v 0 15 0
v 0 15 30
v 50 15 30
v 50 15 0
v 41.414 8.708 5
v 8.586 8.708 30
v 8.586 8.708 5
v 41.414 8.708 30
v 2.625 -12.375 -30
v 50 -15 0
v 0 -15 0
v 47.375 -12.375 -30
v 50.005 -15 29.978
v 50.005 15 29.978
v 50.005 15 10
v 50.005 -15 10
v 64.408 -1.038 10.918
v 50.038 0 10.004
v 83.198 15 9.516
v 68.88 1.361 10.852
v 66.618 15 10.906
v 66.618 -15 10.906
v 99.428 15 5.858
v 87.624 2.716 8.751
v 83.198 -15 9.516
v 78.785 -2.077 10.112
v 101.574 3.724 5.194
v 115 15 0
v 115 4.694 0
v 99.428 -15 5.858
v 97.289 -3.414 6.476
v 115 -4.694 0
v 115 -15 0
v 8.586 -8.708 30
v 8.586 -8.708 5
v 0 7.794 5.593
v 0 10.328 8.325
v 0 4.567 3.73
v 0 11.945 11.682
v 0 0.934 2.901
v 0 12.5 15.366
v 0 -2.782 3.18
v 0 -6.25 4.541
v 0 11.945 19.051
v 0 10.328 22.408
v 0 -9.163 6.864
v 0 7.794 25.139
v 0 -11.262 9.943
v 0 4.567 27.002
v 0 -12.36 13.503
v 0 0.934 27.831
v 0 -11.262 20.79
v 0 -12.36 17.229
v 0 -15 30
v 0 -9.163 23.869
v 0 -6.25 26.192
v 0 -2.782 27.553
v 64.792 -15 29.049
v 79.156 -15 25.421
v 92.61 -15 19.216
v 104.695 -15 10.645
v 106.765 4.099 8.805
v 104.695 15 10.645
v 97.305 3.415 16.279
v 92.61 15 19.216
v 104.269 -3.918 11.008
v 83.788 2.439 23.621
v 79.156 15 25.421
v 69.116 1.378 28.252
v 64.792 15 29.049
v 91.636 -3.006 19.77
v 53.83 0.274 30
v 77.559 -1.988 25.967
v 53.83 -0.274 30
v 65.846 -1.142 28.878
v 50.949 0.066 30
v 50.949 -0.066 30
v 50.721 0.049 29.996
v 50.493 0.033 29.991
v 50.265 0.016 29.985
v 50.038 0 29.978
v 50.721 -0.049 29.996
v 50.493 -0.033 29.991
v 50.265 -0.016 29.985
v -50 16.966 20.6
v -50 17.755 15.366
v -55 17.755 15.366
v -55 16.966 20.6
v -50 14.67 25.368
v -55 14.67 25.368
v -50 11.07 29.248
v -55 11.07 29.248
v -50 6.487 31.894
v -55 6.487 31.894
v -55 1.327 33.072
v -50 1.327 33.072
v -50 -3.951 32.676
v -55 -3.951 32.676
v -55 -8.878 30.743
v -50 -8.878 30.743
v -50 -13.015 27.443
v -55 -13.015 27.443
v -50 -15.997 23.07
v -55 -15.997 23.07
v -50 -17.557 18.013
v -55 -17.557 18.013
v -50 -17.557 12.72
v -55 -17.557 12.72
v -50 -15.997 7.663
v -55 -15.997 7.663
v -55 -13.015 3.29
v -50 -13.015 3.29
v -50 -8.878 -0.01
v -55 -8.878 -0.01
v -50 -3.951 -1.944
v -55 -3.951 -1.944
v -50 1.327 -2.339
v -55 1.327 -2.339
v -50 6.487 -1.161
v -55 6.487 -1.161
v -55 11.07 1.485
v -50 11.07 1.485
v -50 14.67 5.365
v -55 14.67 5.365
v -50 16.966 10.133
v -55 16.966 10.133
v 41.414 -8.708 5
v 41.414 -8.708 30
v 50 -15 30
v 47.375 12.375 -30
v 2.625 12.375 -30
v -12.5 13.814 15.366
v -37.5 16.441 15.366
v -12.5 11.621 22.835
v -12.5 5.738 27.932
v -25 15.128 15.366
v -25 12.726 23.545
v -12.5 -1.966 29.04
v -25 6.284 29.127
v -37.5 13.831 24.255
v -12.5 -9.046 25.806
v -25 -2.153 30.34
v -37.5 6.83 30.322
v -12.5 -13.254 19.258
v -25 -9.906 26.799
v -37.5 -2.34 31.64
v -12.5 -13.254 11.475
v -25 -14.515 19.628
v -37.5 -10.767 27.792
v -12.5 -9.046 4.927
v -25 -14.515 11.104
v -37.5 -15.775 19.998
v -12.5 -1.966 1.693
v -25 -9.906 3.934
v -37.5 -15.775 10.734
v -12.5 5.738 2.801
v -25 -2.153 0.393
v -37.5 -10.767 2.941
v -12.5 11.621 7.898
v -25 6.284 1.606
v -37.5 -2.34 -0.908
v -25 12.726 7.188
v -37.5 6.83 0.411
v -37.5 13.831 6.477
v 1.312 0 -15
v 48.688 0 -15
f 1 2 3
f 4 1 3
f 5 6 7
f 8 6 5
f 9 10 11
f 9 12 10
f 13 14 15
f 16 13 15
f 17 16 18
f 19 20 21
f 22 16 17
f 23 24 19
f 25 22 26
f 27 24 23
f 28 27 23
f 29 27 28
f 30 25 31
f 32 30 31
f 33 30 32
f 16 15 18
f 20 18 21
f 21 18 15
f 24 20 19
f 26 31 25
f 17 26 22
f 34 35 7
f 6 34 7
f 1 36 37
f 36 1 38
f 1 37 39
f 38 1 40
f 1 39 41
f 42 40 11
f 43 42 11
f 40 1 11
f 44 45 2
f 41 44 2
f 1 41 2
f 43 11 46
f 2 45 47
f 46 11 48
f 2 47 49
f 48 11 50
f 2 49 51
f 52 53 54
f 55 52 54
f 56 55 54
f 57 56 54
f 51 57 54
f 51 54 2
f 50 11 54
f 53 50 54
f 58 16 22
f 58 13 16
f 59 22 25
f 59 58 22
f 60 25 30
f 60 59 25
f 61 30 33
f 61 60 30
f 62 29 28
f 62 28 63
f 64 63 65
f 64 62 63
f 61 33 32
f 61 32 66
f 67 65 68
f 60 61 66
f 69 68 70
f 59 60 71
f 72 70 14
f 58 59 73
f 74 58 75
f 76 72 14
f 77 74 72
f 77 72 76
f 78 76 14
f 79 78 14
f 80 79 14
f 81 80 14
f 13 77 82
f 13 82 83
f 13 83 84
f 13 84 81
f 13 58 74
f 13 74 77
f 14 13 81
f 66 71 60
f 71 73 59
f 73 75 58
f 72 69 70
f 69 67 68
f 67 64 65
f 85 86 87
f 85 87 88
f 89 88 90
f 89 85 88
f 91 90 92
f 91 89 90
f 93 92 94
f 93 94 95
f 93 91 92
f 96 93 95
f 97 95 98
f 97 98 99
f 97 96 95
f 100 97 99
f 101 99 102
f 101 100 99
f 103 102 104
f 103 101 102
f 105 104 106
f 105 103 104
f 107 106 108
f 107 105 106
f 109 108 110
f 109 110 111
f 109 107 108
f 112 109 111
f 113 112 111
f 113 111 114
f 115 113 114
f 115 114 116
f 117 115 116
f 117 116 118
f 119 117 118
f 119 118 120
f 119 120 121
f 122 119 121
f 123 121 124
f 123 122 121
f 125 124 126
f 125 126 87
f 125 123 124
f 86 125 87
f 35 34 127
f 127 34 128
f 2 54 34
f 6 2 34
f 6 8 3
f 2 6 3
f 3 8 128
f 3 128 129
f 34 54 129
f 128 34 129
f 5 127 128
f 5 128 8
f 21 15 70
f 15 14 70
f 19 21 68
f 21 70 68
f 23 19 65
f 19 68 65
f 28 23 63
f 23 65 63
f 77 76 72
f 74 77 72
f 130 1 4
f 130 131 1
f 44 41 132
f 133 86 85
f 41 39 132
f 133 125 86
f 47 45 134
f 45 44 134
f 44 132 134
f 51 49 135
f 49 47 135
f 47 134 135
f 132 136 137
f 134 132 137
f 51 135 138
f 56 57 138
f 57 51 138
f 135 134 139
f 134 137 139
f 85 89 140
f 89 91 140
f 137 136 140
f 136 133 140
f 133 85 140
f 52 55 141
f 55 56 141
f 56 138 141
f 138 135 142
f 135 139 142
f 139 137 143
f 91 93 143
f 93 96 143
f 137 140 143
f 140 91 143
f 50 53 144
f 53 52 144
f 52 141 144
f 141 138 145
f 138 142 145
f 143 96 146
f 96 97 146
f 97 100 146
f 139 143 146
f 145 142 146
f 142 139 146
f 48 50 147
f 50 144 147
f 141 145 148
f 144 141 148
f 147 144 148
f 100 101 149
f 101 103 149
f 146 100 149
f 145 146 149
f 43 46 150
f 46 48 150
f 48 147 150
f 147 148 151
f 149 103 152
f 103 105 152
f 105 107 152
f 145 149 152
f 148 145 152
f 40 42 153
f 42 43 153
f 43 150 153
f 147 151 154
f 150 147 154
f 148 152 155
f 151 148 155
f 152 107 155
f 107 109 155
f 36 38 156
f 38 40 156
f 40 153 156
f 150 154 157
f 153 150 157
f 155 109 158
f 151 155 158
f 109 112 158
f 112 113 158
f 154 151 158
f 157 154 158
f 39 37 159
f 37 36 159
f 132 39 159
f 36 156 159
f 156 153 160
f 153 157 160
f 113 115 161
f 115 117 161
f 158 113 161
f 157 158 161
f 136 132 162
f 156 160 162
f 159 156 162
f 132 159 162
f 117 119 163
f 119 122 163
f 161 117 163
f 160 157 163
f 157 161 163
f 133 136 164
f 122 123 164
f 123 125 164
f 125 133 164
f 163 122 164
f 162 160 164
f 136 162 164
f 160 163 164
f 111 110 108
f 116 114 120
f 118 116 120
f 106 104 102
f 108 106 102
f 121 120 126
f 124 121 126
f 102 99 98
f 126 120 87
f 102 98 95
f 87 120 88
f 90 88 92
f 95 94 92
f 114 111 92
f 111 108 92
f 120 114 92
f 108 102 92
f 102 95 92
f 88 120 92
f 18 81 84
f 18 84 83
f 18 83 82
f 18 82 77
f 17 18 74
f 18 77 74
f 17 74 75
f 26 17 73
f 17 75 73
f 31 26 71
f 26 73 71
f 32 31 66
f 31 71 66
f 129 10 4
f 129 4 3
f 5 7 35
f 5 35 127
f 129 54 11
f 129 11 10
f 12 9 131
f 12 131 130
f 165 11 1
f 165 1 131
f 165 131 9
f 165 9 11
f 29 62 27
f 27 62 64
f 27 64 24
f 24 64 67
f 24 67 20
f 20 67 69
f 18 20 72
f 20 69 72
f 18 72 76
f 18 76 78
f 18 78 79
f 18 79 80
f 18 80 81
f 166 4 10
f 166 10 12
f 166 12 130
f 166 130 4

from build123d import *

# Parameters (mm, degrees)
F0_W      = 50
F0_H      = 30
F1_DEPTH  = 15
F1_FACE_W = 50
F1_FACE_H = 30
F2_DEPTH  = 30
F2_TAPER  = 5
F3_R      = 12.5
F4_DEPTH  = 50
F4_TAPER  = -6
F6_DEPTH  = 15
F7_DEPTH  = 5
F9_DEPTH  = 30
F10_W     = 32.8289911151
F10_H     = 17.4164976925
F11_DEPTH = 25


with BuildPart() as f1:
    # F0 (on Front) → F1 (new body, symmetric)
    with BuildSketch(Plane.XZ):
        with Locations((25, 15)):
            Rectangle(F0_W, F0_H)
    extrude(amount=F1_DEPTH, both=True)

    # F1_face (on face) → F2 (join)
    with BuildSketch(Plane(origin=(25, 0, 0), x_dir=(1, 0, 0), z_dir=(0, 0, -1))):
        Rectangle(F1_FACE_W, F1_FACE_H)
    extrude(amount=F2_DEPTH, taper=F2_TAPER)

    # F3 (on Right) → F4 (join)
    with BuildSketch(Plane.YZ):
        with Locations((0, 15.3663739569)):
            Circle(F3_R)
    extrude(amount=-F4_DEPTH, taper=F4_TAPER)

    # F7 (add): a face of the model
    f7_faces = [f1.faces().sort_by_distance(p)[0] for p in [
        (-50, 0, 15.3663739569),
    ]]
    extrude(f7_faces, amount=F7_DEPTH)

    # F10 (on face) → F11 (cut)
    with BuildSketch(Plane.XY.offset(30)):
        with Locations((25, 0)):
            Rectangle(F10_W, F10_H)
    extrude(amount=-F11_DEPTH, mode=Mode.SUBTRACT)


with BuildPart() as f6:
    # F5 (on Front) → F6 (new body, symmetric)
    with BuildSketch(Plane.XZ):
        with BuildLine():
            ThreePointArc((50.0052720308, 9.9999997765), (83.1975081998, 9.5163028491), (115, 0))
            ThreePointArc((115, 0), (86.0267220337, 22.6293864629), (50.0052720308, 29.9775227904))
            Line((50.0052720308, 29.9775227904), (50.0052720308, 9.9999997765))
        make_face()
    extrude(amount=F6_DEPTH, both=True)

    # F8 (on Top) → F9 (cut, symmetric)
    with BuildSketch(Plane.XY):
        Polygon((119.2383021116, 4.9999998882), (50.0376261771, -5.59e-08), (119.2383021116, -5), align=None)
    extrude(amount=F9_DEPTH, both=True, mode=Mode.SUBTRACT)


solid = Compound([f1.part, f6.part])
